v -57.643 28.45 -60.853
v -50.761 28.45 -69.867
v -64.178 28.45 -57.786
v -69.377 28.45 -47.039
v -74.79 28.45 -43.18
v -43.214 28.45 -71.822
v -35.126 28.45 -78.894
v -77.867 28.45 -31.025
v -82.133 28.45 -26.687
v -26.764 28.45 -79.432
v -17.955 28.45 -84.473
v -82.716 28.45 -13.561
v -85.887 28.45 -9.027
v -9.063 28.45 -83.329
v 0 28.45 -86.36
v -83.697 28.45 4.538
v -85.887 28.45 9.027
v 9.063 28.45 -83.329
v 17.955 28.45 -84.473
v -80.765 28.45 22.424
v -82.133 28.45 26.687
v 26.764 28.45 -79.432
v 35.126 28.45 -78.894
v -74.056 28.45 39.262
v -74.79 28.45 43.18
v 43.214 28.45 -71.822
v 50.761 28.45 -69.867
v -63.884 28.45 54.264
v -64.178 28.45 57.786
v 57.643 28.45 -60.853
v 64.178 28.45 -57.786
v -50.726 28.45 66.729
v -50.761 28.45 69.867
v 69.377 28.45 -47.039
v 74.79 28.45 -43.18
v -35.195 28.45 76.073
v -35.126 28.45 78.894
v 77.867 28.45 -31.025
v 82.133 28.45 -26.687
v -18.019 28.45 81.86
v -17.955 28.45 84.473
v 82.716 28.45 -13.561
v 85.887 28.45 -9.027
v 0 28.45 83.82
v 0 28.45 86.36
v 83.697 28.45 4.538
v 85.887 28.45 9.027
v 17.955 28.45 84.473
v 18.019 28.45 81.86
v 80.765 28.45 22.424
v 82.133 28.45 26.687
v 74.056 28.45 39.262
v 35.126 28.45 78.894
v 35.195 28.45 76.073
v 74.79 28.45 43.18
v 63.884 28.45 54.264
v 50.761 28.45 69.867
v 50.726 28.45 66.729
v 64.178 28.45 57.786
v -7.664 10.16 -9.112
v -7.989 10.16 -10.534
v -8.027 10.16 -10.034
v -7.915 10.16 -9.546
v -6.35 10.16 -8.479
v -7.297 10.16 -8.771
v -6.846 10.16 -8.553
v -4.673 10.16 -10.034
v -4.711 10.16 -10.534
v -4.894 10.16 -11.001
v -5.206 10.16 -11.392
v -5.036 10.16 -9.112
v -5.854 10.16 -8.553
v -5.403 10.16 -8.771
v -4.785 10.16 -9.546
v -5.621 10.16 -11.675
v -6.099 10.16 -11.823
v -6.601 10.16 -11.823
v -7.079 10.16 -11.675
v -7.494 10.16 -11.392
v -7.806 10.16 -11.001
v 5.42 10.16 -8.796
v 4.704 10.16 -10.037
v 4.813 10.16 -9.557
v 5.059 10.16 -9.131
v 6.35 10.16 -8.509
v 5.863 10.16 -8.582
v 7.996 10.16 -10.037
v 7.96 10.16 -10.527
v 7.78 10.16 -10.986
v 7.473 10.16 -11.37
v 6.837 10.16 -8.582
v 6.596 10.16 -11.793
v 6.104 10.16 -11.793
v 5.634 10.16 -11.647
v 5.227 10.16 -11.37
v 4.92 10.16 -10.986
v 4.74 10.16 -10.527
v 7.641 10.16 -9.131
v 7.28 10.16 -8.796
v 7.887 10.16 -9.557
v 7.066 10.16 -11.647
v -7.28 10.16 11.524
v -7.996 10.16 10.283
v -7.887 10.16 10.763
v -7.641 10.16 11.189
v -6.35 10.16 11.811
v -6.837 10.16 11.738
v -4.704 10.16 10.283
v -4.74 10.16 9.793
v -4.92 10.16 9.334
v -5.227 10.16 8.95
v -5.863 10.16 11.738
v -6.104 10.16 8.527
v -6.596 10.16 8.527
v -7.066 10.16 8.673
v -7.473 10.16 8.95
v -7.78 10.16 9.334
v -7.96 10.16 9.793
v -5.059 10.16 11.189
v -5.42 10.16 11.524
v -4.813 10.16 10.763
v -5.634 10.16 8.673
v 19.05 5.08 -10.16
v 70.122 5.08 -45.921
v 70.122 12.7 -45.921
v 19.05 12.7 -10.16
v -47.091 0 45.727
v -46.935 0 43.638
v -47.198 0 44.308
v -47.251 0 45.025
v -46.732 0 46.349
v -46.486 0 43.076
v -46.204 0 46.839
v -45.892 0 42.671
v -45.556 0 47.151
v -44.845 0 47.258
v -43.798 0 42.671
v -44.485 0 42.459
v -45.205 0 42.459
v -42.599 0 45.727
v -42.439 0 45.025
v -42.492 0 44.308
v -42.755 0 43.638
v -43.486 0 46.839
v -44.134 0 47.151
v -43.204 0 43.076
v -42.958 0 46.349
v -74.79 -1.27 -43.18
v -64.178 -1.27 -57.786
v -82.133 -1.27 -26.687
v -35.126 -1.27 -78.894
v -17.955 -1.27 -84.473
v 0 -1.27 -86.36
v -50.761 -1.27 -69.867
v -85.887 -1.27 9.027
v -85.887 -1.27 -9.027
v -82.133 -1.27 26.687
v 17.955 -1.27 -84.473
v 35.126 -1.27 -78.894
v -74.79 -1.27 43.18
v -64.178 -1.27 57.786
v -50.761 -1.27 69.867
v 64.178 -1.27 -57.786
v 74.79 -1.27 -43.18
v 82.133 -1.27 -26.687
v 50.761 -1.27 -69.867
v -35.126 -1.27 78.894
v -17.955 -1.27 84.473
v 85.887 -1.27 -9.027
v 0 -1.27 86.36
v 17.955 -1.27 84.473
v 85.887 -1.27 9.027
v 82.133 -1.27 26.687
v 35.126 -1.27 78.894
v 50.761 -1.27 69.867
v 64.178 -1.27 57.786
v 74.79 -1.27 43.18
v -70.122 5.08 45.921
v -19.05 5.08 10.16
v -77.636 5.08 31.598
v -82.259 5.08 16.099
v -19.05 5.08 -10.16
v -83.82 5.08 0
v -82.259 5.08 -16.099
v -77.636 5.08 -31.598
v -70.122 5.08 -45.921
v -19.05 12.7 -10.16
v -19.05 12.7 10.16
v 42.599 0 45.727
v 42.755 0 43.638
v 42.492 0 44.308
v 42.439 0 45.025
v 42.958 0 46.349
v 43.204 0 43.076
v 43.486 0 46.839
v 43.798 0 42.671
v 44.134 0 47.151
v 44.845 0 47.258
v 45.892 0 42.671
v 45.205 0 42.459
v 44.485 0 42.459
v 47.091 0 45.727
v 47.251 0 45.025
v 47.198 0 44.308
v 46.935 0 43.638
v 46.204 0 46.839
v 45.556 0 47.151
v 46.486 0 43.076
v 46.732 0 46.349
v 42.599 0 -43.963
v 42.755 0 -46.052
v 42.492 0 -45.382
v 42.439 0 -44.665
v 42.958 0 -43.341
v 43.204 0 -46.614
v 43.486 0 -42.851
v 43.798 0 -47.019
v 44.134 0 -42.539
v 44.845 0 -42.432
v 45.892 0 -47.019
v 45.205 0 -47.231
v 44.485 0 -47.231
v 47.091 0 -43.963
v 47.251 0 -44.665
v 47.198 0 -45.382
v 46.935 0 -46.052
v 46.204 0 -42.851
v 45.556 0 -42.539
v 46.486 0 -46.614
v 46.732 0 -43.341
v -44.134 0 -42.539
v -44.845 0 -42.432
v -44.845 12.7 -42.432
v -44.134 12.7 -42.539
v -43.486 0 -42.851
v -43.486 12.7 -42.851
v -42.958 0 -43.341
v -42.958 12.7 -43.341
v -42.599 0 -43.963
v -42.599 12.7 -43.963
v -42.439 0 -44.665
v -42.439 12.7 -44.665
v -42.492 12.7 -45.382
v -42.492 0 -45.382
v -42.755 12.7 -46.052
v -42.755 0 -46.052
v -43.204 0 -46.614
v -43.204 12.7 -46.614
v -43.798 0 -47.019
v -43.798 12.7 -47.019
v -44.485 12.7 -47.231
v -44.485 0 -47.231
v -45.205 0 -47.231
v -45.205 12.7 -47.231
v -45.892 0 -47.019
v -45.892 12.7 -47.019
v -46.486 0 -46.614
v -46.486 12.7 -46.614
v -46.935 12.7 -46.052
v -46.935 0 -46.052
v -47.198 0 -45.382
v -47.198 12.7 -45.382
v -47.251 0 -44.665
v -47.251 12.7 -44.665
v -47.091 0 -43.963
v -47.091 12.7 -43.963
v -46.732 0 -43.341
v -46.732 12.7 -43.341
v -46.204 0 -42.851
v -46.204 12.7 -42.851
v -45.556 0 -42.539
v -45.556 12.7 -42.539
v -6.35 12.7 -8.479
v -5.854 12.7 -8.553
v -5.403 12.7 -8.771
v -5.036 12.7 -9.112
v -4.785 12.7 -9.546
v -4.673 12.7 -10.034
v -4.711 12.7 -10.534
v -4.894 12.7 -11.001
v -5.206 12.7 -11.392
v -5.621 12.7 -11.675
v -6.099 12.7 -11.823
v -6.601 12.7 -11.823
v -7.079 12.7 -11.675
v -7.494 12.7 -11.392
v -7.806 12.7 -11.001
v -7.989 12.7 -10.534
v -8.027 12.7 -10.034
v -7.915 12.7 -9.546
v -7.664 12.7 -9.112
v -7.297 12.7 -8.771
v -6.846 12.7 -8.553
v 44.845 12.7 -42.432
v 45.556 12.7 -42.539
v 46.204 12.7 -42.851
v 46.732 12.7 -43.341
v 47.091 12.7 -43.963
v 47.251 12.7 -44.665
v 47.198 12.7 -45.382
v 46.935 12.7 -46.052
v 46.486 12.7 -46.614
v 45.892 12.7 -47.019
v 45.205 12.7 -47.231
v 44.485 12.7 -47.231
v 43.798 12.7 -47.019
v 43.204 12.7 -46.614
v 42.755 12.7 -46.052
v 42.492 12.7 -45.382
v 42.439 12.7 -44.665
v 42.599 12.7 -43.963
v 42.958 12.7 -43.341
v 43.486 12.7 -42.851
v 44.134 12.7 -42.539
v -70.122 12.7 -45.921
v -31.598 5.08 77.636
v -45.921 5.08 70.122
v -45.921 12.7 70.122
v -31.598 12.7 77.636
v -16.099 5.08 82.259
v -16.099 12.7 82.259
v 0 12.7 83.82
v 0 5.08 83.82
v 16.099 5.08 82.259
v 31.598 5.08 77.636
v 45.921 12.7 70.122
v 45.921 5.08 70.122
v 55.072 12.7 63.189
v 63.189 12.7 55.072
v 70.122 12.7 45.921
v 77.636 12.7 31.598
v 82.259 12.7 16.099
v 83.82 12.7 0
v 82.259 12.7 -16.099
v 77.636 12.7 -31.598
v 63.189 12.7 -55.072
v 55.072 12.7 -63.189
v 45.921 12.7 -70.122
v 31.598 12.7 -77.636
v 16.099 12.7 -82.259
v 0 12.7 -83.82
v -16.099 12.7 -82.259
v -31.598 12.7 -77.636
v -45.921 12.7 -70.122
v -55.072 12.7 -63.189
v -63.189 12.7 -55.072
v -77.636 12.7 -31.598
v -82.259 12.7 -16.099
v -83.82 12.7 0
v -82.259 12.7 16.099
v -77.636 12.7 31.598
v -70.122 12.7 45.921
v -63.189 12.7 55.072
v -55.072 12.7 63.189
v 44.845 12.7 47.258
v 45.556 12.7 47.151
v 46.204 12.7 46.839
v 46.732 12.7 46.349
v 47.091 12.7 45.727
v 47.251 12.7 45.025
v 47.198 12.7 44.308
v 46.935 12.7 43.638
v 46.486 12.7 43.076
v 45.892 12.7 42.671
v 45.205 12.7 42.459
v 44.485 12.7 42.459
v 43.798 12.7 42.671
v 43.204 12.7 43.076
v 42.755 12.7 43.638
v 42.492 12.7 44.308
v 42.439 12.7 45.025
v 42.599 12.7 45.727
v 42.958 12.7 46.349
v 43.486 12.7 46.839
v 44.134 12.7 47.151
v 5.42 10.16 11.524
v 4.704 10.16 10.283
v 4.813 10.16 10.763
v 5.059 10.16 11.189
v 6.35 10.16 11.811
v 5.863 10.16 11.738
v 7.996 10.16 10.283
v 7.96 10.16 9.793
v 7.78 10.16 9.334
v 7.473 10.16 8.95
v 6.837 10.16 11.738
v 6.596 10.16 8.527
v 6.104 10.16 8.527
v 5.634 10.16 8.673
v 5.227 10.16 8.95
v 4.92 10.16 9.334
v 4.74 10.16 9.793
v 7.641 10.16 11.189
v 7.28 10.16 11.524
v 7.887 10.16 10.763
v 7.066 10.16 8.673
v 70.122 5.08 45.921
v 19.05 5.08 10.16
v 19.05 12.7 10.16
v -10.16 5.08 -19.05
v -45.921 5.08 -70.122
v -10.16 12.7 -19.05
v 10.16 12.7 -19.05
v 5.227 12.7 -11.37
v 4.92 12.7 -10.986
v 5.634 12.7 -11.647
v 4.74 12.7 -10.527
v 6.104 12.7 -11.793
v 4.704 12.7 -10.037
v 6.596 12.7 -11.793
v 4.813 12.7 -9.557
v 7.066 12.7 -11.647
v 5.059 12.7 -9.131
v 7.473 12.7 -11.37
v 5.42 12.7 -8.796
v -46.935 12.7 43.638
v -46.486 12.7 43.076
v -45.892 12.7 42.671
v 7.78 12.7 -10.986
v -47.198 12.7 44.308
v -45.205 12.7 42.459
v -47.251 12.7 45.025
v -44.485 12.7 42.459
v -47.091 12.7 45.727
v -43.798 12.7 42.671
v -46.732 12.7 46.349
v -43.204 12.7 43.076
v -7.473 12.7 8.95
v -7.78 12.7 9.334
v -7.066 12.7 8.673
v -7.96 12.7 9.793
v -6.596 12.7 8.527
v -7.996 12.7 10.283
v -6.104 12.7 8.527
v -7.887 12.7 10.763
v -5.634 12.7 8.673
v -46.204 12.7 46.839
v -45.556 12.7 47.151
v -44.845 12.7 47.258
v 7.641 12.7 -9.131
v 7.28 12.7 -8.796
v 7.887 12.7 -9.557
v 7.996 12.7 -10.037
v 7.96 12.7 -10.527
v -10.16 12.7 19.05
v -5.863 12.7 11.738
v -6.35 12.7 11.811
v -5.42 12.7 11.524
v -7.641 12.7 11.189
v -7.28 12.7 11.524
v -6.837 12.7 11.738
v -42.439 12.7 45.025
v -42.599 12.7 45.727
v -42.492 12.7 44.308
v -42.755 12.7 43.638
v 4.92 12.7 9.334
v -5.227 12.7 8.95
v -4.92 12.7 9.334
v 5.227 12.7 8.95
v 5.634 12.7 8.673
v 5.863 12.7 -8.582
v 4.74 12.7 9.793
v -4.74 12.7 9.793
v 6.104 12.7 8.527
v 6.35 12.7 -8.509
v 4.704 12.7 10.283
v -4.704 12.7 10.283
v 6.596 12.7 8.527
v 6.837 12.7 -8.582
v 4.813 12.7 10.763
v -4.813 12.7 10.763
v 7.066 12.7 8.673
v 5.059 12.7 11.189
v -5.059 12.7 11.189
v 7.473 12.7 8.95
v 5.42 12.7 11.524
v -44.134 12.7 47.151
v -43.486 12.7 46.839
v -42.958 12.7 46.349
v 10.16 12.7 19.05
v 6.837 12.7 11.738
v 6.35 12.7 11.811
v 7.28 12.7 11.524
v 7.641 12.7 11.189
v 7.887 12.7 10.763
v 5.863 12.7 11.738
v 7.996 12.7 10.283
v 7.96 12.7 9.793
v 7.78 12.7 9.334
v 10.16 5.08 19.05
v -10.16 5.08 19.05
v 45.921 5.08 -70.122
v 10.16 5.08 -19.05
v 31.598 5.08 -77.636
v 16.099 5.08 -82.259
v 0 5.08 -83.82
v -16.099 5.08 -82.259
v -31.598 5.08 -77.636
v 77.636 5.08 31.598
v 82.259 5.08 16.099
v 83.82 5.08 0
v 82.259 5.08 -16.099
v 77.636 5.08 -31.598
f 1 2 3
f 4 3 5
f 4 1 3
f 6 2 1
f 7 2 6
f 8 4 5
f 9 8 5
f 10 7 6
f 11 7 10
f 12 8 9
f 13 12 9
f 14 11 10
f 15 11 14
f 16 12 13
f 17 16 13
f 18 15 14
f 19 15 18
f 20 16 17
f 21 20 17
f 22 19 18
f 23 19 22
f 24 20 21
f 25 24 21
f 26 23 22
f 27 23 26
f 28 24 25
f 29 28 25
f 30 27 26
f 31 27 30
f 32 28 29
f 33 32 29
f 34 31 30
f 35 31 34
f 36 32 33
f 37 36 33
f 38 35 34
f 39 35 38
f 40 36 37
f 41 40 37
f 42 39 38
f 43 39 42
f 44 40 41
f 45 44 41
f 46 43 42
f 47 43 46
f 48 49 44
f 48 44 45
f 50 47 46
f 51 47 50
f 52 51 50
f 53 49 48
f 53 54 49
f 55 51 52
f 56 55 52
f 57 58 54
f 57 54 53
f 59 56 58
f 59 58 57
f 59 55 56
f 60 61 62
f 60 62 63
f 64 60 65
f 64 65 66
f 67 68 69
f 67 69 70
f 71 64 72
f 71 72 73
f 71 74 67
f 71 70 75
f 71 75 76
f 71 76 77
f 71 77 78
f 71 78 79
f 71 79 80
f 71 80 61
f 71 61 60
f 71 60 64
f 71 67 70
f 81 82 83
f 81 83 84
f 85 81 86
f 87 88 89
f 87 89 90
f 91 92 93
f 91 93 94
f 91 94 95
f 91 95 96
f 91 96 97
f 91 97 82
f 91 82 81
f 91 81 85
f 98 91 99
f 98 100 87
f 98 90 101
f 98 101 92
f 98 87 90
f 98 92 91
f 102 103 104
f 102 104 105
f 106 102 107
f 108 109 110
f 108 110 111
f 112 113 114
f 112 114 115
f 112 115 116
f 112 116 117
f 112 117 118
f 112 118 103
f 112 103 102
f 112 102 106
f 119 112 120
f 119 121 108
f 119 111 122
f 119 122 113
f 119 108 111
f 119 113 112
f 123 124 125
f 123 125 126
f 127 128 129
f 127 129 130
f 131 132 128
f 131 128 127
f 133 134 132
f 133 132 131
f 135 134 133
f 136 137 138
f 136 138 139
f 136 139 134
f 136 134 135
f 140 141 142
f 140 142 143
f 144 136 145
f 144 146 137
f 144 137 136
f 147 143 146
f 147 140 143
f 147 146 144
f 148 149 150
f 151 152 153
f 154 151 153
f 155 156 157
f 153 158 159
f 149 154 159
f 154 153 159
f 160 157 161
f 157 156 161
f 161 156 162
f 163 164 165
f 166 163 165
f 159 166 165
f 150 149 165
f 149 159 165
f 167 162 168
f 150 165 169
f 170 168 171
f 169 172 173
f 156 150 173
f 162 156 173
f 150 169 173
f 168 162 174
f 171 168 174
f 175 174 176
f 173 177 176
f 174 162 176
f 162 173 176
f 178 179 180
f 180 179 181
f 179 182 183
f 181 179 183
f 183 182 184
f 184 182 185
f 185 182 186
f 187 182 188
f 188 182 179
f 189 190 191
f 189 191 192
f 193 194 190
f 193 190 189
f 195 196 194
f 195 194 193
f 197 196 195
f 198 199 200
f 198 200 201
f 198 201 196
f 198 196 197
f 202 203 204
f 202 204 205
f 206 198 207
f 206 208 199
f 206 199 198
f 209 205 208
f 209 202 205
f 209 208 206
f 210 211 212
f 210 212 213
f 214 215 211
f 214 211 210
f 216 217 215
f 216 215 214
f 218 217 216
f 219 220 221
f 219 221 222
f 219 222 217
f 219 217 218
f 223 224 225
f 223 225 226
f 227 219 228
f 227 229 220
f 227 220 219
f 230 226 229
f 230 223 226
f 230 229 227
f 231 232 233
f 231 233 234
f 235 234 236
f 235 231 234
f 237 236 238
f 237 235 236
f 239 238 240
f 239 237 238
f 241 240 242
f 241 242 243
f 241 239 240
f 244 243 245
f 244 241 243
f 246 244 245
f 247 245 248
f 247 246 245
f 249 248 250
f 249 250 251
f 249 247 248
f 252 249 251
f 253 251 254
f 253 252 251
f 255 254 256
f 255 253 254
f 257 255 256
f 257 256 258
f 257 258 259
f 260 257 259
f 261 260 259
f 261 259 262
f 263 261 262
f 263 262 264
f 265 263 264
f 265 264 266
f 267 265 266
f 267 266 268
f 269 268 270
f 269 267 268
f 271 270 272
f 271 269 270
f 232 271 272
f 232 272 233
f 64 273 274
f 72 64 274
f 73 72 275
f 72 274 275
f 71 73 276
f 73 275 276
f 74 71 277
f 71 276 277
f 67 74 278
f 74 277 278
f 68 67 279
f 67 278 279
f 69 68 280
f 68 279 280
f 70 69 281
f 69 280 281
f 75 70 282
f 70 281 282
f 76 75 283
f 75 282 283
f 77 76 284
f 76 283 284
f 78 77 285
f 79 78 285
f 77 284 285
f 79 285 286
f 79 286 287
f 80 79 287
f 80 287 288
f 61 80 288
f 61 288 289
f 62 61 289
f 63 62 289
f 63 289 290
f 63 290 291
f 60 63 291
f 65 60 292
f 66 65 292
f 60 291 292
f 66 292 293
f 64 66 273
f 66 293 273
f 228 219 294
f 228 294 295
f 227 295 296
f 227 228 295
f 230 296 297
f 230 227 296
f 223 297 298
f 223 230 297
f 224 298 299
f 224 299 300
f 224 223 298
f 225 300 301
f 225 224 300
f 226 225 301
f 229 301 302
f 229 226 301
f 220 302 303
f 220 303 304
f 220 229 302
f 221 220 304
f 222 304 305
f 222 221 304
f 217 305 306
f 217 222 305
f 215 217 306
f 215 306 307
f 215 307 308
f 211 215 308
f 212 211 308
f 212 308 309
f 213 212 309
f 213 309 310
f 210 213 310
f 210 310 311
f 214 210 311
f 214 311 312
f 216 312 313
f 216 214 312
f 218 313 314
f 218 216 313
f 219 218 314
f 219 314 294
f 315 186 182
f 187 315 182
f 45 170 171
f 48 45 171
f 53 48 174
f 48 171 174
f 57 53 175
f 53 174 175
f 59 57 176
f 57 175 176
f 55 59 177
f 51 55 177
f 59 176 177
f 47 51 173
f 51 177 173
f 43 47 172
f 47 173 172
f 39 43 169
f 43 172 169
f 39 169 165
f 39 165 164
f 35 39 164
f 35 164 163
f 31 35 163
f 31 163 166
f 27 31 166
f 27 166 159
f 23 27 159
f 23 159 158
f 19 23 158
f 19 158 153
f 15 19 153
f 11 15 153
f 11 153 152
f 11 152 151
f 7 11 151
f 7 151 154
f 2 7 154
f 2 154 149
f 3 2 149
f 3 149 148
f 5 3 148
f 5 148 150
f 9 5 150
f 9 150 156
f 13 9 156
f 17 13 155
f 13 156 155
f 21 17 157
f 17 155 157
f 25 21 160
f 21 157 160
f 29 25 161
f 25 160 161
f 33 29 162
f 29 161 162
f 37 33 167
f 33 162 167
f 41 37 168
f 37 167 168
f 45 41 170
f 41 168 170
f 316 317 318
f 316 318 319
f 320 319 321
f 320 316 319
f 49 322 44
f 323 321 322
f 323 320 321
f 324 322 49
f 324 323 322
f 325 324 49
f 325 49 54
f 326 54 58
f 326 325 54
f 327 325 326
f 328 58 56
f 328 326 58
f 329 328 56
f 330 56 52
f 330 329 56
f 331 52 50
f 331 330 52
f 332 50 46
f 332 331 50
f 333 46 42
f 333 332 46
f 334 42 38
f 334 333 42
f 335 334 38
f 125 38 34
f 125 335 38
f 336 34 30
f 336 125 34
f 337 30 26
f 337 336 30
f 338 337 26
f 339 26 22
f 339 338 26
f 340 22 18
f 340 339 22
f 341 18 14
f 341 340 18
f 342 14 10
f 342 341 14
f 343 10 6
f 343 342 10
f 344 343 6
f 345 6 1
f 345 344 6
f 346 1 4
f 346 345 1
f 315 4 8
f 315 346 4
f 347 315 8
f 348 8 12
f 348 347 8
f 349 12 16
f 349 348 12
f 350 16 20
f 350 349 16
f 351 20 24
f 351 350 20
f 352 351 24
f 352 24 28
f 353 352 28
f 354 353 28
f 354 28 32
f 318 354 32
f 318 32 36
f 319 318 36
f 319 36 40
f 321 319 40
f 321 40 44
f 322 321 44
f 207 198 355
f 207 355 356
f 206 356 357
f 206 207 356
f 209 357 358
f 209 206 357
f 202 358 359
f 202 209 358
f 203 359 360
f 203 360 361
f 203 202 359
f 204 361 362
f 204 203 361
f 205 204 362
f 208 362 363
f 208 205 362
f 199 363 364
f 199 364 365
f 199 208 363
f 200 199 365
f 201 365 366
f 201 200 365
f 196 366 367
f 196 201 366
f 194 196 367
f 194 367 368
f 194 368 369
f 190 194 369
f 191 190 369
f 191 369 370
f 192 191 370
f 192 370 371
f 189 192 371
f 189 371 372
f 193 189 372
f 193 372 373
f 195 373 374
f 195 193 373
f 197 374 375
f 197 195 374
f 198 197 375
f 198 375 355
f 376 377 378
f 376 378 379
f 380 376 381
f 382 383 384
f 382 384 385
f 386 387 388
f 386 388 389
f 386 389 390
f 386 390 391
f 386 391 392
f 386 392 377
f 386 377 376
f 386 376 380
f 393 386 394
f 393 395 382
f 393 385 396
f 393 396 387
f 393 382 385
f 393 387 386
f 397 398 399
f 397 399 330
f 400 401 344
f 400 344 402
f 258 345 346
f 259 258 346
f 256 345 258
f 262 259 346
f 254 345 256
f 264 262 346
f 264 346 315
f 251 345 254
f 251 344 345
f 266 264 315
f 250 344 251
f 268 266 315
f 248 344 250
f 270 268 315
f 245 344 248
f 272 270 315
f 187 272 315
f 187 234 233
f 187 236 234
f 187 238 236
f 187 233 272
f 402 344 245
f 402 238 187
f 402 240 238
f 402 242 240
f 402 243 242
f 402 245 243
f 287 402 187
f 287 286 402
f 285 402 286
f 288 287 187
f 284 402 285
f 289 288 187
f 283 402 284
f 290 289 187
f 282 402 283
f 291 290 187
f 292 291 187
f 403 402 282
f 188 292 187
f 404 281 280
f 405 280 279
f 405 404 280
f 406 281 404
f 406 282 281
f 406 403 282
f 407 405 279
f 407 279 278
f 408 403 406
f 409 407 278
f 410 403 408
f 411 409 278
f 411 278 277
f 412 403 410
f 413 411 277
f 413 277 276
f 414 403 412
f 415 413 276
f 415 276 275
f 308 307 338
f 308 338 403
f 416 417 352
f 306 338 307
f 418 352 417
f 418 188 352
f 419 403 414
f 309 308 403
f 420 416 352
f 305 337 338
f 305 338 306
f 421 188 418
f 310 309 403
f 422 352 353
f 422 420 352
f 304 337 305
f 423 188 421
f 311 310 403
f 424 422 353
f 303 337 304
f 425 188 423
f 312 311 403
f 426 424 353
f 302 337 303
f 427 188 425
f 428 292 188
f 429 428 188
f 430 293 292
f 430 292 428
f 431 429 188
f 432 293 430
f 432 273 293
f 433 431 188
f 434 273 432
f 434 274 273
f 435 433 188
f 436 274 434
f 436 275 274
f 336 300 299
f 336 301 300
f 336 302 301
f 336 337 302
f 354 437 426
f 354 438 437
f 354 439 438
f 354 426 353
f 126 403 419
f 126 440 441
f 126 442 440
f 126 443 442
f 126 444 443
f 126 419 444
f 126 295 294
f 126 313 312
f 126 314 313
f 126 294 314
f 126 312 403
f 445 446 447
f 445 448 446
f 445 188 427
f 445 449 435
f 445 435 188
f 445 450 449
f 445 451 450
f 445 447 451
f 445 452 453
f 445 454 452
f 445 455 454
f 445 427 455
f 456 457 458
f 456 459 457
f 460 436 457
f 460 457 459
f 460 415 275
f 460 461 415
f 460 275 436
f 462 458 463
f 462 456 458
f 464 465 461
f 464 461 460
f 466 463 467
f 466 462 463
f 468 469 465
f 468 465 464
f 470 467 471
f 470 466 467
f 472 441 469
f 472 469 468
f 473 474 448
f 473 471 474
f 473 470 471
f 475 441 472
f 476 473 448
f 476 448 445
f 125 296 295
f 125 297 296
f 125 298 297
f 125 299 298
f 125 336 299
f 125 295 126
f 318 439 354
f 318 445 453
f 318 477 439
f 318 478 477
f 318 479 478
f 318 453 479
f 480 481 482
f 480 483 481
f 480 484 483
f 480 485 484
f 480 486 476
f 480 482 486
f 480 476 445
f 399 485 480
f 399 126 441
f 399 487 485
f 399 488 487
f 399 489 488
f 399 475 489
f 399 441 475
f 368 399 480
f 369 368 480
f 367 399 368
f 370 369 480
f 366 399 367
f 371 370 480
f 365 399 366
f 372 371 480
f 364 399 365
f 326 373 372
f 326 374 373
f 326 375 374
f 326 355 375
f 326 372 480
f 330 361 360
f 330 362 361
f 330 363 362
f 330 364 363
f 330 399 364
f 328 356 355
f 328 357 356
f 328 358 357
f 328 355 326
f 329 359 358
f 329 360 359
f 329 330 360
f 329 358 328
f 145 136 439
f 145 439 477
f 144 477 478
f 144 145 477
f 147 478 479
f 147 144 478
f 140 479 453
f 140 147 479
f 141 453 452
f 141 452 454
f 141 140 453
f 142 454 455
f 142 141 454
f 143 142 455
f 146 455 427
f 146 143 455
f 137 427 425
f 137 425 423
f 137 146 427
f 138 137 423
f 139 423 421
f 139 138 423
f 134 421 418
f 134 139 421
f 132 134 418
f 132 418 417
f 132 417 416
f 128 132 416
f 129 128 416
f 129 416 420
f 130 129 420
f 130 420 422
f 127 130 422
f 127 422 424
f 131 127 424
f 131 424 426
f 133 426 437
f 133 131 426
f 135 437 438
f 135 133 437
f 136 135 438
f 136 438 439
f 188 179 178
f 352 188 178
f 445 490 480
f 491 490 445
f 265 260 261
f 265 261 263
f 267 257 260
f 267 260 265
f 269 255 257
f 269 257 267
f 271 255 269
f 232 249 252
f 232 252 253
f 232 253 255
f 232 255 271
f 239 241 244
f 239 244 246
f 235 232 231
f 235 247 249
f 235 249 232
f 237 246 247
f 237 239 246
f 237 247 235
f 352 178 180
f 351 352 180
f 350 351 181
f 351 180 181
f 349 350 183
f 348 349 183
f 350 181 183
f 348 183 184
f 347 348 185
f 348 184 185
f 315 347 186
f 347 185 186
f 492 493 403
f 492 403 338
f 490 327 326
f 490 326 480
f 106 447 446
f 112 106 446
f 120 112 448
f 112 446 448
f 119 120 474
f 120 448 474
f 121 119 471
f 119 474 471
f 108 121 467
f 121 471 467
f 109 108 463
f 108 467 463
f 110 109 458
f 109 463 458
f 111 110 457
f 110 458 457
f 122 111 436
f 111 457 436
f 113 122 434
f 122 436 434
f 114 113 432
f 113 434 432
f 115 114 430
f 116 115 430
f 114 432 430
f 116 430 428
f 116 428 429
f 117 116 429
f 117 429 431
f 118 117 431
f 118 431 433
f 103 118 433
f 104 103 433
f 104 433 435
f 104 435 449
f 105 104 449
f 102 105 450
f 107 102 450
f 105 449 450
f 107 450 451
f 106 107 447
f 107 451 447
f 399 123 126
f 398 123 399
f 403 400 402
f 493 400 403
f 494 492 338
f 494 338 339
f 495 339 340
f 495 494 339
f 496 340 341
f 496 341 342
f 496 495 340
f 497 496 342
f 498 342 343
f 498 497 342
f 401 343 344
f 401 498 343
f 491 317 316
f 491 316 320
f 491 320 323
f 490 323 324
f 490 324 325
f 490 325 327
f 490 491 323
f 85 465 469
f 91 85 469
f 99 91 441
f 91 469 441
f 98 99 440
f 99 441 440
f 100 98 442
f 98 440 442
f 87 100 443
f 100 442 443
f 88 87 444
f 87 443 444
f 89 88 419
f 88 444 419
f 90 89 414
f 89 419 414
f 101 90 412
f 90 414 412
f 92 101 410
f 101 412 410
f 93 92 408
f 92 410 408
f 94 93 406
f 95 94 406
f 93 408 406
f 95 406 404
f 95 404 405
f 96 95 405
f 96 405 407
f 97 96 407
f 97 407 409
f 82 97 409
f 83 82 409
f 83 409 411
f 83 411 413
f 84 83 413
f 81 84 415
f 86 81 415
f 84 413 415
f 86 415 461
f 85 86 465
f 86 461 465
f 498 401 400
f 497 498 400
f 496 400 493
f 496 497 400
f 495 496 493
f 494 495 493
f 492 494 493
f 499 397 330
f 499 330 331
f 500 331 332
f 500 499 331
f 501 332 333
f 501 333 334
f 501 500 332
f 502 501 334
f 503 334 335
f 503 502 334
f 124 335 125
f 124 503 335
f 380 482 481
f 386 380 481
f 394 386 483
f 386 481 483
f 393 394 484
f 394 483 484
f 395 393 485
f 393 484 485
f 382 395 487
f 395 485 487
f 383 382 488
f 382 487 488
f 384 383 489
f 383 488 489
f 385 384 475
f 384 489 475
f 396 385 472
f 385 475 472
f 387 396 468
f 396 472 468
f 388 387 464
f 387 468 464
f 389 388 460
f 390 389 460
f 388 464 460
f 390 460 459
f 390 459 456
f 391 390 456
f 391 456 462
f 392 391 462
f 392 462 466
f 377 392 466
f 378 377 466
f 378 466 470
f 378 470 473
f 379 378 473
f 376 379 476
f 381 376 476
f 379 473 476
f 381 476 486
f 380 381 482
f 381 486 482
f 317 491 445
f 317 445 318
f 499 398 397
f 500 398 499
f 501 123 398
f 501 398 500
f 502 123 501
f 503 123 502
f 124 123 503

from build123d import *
from build123d.topology import SkipClean

# Parameters (mm, degrees)
SKETCH1_R           = 86.36
SKETCH1_R_2         = 83.82
BOSS_EXTRUDE1_DEPTH = 28.45
BOSS_EXTRUDE2_START = -1.27
SKETCH1_2_R         = 86.36
SKETCH1_2_R_2       = 83.82
BOSS_EXTRUDE2_DEPTH = 1.27
SKETCH2_R           = 83.82
SKETCH2_R_2         = 2.413
BOSS_EXTRUDE3_DEPTH = 12.7
SKETCH3_R           = 1.651
SKETCH3_R_2         = 1.681286521
CUT_EXTRUDE1_DEPTH  = 2.54
CUT_EXTRUDE2_START  = -7.62
CUT_EXTRUDE2_DEPTH  = 7.62


with BuildPart() as part:
    # Sketch1 → Boss-Extrude1 (new body)
    with BuildSketch(Plane(origin=(0, 0, 0), x_dir=(1, 0, 0), z_dir=(0, 1, 0))):
        Circle(SKETCH1_R)
        Circle(SKETCH1_R_2, mode=Mode.SUBTRACT)
    extrude(amount=BOSS_EXTRUDE1_DEPTH)

    # Sketch1<2> → Boss-Extrude2 (add)
    # profile 1 of 2: a face of its own
    with BuildSketch(Plane(origin=(0, 0, 0), x_dir=(1, 0, 0), z_dir=(0, 1, 0)).offset(BOSS_EXTRUDE2_START)):
        Circle(SKETCH1_2_R)
        Circle(SKETCH1_2_R_2, mode=Mode.SUBTRACT)
    # profile 2 of 2: a face of its own
    with BuildSketch(Plane(origin=(0, 0, 0), x_dir=(1, 0, 0), z_dir=(0, 1, 0)).offset(BOSS_EXTRUDE2_START)):
        Circle(SKETCH1_2_R_2)
    extrude(amount=BOSS_EXTRUDE2_DEPTH)

    # Sketch2 → Boss-Extrude3 (add)
    with BuildSketch(Plane(origin=(0, 0, 0), x_dir=(1, 0, 0), z_dir=(0, 1, 0))):
        Circle(SKETCH2_R)
        with Locations((-44.845, -44.845)):
            Circle(SKETCH2_R_2, mode=Mode.SUBTRACT)
        with Locations((44.845, -44.845)):
            Circle(SKETCH2_R_2, mode=Mode.SUBTRACT)
        with Locations((-44.845, 44.845)):
            Circle(SKETCH2_R_2, mode=Mode.SUBTRACT)
        with Locations((44.845, 44.845)):
            Circle(SKETCH2_R_2, mode=Mode.SUBTRACT)
    extrude(amount=BOSS_EXTRUDE3_DEPTH)

    # Sketch3 → Cut-Extrude1 (cut)
    with BuildSketch(Plane(origin=(0, 12.7, 0), x_dir=(1, 0, 0), z_dir=(0, 1, 0))):
        with Locations((6.35, 10.16)):
            Circle(SKETCH3_R)
        with Locations((6.35, -10.16)):
            Circle(SKETCH3_R)
        with Locations((-6.35, -10.16)):
            Circle(SKETCH3_R)
        with Locations((-6.35, 10.16)):
            Circle(SKETCH3_R_2)
    extrude(amount=-CUT_EXTRUDE1_DEPTH, mode=Mode.SUBTRACT)

    # Sketch4 → Cut-Extrude2 (cut)
    with SkipClean():  # the faces are left unmerged after this step: merging them gives an invalid solid
        with BuildSketch(Plane(origin=(0, 12.7, 0), x_dir=(1, 0, 0), z_dir=(0, 1, 0)).offset(CUT_EXTRUDE2_START)):
            with BuildLine():
                Line((-70.12180118, 45.920860176), (-19.05, 10.16))
                Line((-19.05, 10.16), (-19.05, -10.16))
                Line((-19.05, -10.16), (-70.12180118, -45.920860176))
                ThreePointArc((-70.12180118, -45.920860176), (-83.82, 0), (-70.12180118, 45.920860176))
            make_face()
            with BuildLine():
                Line((-10.16, 19.05), (10.16, 19.05))
                Line((10.16, 19.05), (45.920860176, 70.12180118))
                ThreePointArc((45.920860176, 70.12180118), (0, 83.82), (-45.920860176, 70.12180118))
                Line((-45.920860176, 70.12180118), (-10.16, 19.05))
            make_face()
            with BuildLine():
                Line((19.05, 10.16), (19.05, -10.16))
                Line((19.05, -10.16), (70.12180118, -45.920860176))
                ThreePointArc((70.12180118, -45.920860176), (83.82, 0), (70.12180118, 45.920860176))
                Line((70.12180118, 45.920860176), (19.05, 10.16))
            make_face()
            with BuildLine():
                Line((10.16, -19.05), (-10.16, -19.05))
                Line((-10.16, -19.05), (-45.920860176, -70.12180118))
                ThreePointArc((-45.920860176, -70.12180118), (0, -83.82), (45.920860176, -70.12180118))
                Line((45.920860176, -70.12180118), (10.16, -19.05))
            make_face()
        extrude(amount=CUT_EXTRUDE2_DEPTH, mode=Mode.SUBTRACT)


solid = part.part
